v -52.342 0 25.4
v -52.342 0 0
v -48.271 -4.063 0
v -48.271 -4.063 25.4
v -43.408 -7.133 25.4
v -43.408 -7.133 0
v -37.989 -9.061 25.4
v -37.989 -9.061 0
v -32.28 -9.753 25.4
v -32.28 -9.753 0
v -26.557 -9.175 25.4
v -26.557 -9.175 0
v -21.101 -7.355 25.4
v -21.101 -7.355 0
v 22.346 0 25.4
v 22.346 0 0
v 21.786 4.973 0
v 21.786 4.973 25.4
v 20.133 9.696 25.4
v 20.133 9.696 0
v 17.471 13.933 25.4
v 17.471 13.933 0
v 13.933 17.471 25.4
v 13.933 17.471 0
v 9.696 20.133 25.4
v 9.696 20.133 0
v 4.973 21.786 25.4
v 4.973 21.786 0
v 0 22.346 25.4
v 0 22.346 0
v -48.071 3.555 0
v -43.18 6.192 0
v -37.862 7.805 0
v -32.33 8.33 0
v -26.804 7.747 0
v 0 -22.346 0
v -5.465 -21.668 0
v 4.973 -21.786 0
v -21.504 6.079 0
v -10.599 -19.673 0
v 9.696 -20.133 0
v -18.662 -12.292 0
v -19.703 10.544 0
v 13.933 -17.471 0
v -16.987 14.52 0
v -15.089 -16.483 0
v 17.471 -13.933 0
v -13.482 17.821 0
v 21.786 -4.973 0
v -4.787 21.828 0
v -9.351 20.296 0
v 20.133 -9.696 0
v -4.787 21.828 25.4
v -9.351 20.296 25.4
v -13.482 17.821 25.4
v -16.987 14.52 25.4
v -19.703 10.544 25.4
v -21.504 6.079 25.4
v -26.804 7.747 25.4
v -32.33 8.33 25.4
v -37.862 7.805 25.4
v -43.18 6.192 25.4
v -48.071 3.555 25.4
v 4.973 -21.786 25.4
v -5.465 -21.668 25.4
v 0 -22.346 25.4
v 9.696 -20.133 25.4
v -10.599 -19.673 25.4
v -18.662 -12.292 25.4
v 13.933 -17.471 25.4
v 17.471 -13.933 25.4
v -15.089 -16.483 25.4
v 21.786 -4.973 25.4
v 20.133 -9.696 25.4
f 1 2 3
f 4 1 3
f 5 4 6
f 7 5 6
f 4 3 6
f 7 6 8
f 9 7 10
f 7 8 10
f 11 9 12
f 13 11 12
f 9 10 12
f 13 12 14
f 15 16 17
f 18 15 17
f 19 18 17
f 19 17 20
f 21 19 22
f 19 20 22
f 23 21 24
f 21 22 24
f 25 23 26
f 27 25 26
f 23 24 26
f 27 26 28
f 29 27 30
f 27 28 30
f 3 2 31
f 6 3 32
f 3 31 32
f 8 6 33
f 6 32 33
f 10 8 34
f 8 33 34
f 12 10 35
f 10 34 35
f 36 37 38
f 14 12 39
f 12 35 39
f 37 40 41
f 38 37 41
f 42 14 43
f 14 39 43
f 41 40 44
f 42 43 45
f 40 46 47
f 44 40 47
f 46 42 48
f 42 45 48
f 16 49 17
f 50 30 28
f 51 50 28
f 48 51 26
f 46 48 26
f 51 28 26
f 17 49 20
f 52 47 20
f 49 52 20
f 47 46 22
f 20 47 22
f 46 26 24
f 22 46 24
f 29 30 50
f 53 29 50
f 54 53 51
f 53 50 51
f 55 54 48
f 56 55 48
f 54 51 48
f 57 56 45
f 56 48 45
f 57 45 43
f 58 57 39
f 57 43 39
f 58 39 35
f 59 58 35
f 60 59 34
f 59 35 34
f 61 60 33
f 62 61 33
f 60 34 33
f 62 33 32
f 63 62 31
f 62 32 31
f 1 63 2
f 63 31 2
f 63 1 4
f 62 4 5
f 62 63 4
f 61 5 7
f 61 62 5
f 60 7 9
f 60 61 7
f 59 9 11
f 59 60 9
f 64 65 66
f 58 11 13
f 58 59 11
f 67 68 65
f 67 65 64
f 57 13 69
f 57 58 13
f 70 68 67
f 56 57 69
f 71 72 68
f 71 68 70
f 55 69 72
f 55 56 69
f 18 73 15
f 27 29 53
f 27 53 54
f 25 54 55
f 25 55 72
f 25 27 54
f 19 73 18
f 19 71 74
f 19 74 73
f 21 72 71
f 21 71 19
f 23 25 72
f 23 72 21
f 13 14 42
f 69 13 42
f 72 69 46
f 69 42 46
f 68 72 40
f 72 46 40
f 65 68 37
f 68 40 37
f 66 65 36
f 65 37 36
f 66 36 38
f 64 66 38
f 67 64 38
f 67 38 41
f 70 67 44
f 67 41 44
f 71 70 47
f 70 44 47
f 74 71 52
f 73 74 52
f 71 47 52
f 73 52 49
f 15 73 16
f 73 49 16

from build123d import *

# Parameters (mm, degrees)
F2_DEPTH = 25.4


# Not quite as in the source:
# - the program builds the solid bodies; features that only make, move or delete a surface that nothing else refers to are left out


with BuildPart() as f2:
    # F0 (on Top) → F2 (new body)
    with BuildSketch(Plane.XY):
        with BuildLine():
            Line((0, -22.3464633732), (0, 0))
            Line((0, 0), (0, 22.3464633732))
            ThreePointArc((0, 22.3464633732), (-13.4819478567, 17.8213778165), (-21.5037952489, 6.0787511204))
            ThreePointArc((-21.5037952489, 6.0787511204), (-22.3364486511, -0.6689446499), (-21.1014820814, -7.354718163))
            ThreePointArc((-21.1014820814, -7.354718163), (-12.9424202767, -18.216975124), (0, -22.3464633732))
        make_face()
        with BuildLine():
            Line((0, 22.3464633732), (0, 0))
            Line((0, 0), (0, -22.3464633732))
            ThreePointArc((0, -22.3464633732), (15.8013357867, -15.8013357867), (22.3464633732, 0))
            ThreePointArc((22.3464633732, 0), (15.8013357867, 15.8013357867), (0, 22.3464633732))
        make_face()
        with BuildLine():
            ThreePointArc((-21.1014820814, -7.354718163), (-22.3364486511, -0.6689446499), (-21.5037952489, 6.0787511204))
            ThreePointArc((-21.5037952489, 6.0787511204), (-37.8621842038, 7.8047564636), (-52.3418858647, 0))
            ThreePointArc((-52.3418858647, 0), (-37.9892096461, -9.0613878034), (-21.1014820814, -7.354718163))
        make_face()
    extrude(amount=F2_DEPTH)


solid = f2.part
